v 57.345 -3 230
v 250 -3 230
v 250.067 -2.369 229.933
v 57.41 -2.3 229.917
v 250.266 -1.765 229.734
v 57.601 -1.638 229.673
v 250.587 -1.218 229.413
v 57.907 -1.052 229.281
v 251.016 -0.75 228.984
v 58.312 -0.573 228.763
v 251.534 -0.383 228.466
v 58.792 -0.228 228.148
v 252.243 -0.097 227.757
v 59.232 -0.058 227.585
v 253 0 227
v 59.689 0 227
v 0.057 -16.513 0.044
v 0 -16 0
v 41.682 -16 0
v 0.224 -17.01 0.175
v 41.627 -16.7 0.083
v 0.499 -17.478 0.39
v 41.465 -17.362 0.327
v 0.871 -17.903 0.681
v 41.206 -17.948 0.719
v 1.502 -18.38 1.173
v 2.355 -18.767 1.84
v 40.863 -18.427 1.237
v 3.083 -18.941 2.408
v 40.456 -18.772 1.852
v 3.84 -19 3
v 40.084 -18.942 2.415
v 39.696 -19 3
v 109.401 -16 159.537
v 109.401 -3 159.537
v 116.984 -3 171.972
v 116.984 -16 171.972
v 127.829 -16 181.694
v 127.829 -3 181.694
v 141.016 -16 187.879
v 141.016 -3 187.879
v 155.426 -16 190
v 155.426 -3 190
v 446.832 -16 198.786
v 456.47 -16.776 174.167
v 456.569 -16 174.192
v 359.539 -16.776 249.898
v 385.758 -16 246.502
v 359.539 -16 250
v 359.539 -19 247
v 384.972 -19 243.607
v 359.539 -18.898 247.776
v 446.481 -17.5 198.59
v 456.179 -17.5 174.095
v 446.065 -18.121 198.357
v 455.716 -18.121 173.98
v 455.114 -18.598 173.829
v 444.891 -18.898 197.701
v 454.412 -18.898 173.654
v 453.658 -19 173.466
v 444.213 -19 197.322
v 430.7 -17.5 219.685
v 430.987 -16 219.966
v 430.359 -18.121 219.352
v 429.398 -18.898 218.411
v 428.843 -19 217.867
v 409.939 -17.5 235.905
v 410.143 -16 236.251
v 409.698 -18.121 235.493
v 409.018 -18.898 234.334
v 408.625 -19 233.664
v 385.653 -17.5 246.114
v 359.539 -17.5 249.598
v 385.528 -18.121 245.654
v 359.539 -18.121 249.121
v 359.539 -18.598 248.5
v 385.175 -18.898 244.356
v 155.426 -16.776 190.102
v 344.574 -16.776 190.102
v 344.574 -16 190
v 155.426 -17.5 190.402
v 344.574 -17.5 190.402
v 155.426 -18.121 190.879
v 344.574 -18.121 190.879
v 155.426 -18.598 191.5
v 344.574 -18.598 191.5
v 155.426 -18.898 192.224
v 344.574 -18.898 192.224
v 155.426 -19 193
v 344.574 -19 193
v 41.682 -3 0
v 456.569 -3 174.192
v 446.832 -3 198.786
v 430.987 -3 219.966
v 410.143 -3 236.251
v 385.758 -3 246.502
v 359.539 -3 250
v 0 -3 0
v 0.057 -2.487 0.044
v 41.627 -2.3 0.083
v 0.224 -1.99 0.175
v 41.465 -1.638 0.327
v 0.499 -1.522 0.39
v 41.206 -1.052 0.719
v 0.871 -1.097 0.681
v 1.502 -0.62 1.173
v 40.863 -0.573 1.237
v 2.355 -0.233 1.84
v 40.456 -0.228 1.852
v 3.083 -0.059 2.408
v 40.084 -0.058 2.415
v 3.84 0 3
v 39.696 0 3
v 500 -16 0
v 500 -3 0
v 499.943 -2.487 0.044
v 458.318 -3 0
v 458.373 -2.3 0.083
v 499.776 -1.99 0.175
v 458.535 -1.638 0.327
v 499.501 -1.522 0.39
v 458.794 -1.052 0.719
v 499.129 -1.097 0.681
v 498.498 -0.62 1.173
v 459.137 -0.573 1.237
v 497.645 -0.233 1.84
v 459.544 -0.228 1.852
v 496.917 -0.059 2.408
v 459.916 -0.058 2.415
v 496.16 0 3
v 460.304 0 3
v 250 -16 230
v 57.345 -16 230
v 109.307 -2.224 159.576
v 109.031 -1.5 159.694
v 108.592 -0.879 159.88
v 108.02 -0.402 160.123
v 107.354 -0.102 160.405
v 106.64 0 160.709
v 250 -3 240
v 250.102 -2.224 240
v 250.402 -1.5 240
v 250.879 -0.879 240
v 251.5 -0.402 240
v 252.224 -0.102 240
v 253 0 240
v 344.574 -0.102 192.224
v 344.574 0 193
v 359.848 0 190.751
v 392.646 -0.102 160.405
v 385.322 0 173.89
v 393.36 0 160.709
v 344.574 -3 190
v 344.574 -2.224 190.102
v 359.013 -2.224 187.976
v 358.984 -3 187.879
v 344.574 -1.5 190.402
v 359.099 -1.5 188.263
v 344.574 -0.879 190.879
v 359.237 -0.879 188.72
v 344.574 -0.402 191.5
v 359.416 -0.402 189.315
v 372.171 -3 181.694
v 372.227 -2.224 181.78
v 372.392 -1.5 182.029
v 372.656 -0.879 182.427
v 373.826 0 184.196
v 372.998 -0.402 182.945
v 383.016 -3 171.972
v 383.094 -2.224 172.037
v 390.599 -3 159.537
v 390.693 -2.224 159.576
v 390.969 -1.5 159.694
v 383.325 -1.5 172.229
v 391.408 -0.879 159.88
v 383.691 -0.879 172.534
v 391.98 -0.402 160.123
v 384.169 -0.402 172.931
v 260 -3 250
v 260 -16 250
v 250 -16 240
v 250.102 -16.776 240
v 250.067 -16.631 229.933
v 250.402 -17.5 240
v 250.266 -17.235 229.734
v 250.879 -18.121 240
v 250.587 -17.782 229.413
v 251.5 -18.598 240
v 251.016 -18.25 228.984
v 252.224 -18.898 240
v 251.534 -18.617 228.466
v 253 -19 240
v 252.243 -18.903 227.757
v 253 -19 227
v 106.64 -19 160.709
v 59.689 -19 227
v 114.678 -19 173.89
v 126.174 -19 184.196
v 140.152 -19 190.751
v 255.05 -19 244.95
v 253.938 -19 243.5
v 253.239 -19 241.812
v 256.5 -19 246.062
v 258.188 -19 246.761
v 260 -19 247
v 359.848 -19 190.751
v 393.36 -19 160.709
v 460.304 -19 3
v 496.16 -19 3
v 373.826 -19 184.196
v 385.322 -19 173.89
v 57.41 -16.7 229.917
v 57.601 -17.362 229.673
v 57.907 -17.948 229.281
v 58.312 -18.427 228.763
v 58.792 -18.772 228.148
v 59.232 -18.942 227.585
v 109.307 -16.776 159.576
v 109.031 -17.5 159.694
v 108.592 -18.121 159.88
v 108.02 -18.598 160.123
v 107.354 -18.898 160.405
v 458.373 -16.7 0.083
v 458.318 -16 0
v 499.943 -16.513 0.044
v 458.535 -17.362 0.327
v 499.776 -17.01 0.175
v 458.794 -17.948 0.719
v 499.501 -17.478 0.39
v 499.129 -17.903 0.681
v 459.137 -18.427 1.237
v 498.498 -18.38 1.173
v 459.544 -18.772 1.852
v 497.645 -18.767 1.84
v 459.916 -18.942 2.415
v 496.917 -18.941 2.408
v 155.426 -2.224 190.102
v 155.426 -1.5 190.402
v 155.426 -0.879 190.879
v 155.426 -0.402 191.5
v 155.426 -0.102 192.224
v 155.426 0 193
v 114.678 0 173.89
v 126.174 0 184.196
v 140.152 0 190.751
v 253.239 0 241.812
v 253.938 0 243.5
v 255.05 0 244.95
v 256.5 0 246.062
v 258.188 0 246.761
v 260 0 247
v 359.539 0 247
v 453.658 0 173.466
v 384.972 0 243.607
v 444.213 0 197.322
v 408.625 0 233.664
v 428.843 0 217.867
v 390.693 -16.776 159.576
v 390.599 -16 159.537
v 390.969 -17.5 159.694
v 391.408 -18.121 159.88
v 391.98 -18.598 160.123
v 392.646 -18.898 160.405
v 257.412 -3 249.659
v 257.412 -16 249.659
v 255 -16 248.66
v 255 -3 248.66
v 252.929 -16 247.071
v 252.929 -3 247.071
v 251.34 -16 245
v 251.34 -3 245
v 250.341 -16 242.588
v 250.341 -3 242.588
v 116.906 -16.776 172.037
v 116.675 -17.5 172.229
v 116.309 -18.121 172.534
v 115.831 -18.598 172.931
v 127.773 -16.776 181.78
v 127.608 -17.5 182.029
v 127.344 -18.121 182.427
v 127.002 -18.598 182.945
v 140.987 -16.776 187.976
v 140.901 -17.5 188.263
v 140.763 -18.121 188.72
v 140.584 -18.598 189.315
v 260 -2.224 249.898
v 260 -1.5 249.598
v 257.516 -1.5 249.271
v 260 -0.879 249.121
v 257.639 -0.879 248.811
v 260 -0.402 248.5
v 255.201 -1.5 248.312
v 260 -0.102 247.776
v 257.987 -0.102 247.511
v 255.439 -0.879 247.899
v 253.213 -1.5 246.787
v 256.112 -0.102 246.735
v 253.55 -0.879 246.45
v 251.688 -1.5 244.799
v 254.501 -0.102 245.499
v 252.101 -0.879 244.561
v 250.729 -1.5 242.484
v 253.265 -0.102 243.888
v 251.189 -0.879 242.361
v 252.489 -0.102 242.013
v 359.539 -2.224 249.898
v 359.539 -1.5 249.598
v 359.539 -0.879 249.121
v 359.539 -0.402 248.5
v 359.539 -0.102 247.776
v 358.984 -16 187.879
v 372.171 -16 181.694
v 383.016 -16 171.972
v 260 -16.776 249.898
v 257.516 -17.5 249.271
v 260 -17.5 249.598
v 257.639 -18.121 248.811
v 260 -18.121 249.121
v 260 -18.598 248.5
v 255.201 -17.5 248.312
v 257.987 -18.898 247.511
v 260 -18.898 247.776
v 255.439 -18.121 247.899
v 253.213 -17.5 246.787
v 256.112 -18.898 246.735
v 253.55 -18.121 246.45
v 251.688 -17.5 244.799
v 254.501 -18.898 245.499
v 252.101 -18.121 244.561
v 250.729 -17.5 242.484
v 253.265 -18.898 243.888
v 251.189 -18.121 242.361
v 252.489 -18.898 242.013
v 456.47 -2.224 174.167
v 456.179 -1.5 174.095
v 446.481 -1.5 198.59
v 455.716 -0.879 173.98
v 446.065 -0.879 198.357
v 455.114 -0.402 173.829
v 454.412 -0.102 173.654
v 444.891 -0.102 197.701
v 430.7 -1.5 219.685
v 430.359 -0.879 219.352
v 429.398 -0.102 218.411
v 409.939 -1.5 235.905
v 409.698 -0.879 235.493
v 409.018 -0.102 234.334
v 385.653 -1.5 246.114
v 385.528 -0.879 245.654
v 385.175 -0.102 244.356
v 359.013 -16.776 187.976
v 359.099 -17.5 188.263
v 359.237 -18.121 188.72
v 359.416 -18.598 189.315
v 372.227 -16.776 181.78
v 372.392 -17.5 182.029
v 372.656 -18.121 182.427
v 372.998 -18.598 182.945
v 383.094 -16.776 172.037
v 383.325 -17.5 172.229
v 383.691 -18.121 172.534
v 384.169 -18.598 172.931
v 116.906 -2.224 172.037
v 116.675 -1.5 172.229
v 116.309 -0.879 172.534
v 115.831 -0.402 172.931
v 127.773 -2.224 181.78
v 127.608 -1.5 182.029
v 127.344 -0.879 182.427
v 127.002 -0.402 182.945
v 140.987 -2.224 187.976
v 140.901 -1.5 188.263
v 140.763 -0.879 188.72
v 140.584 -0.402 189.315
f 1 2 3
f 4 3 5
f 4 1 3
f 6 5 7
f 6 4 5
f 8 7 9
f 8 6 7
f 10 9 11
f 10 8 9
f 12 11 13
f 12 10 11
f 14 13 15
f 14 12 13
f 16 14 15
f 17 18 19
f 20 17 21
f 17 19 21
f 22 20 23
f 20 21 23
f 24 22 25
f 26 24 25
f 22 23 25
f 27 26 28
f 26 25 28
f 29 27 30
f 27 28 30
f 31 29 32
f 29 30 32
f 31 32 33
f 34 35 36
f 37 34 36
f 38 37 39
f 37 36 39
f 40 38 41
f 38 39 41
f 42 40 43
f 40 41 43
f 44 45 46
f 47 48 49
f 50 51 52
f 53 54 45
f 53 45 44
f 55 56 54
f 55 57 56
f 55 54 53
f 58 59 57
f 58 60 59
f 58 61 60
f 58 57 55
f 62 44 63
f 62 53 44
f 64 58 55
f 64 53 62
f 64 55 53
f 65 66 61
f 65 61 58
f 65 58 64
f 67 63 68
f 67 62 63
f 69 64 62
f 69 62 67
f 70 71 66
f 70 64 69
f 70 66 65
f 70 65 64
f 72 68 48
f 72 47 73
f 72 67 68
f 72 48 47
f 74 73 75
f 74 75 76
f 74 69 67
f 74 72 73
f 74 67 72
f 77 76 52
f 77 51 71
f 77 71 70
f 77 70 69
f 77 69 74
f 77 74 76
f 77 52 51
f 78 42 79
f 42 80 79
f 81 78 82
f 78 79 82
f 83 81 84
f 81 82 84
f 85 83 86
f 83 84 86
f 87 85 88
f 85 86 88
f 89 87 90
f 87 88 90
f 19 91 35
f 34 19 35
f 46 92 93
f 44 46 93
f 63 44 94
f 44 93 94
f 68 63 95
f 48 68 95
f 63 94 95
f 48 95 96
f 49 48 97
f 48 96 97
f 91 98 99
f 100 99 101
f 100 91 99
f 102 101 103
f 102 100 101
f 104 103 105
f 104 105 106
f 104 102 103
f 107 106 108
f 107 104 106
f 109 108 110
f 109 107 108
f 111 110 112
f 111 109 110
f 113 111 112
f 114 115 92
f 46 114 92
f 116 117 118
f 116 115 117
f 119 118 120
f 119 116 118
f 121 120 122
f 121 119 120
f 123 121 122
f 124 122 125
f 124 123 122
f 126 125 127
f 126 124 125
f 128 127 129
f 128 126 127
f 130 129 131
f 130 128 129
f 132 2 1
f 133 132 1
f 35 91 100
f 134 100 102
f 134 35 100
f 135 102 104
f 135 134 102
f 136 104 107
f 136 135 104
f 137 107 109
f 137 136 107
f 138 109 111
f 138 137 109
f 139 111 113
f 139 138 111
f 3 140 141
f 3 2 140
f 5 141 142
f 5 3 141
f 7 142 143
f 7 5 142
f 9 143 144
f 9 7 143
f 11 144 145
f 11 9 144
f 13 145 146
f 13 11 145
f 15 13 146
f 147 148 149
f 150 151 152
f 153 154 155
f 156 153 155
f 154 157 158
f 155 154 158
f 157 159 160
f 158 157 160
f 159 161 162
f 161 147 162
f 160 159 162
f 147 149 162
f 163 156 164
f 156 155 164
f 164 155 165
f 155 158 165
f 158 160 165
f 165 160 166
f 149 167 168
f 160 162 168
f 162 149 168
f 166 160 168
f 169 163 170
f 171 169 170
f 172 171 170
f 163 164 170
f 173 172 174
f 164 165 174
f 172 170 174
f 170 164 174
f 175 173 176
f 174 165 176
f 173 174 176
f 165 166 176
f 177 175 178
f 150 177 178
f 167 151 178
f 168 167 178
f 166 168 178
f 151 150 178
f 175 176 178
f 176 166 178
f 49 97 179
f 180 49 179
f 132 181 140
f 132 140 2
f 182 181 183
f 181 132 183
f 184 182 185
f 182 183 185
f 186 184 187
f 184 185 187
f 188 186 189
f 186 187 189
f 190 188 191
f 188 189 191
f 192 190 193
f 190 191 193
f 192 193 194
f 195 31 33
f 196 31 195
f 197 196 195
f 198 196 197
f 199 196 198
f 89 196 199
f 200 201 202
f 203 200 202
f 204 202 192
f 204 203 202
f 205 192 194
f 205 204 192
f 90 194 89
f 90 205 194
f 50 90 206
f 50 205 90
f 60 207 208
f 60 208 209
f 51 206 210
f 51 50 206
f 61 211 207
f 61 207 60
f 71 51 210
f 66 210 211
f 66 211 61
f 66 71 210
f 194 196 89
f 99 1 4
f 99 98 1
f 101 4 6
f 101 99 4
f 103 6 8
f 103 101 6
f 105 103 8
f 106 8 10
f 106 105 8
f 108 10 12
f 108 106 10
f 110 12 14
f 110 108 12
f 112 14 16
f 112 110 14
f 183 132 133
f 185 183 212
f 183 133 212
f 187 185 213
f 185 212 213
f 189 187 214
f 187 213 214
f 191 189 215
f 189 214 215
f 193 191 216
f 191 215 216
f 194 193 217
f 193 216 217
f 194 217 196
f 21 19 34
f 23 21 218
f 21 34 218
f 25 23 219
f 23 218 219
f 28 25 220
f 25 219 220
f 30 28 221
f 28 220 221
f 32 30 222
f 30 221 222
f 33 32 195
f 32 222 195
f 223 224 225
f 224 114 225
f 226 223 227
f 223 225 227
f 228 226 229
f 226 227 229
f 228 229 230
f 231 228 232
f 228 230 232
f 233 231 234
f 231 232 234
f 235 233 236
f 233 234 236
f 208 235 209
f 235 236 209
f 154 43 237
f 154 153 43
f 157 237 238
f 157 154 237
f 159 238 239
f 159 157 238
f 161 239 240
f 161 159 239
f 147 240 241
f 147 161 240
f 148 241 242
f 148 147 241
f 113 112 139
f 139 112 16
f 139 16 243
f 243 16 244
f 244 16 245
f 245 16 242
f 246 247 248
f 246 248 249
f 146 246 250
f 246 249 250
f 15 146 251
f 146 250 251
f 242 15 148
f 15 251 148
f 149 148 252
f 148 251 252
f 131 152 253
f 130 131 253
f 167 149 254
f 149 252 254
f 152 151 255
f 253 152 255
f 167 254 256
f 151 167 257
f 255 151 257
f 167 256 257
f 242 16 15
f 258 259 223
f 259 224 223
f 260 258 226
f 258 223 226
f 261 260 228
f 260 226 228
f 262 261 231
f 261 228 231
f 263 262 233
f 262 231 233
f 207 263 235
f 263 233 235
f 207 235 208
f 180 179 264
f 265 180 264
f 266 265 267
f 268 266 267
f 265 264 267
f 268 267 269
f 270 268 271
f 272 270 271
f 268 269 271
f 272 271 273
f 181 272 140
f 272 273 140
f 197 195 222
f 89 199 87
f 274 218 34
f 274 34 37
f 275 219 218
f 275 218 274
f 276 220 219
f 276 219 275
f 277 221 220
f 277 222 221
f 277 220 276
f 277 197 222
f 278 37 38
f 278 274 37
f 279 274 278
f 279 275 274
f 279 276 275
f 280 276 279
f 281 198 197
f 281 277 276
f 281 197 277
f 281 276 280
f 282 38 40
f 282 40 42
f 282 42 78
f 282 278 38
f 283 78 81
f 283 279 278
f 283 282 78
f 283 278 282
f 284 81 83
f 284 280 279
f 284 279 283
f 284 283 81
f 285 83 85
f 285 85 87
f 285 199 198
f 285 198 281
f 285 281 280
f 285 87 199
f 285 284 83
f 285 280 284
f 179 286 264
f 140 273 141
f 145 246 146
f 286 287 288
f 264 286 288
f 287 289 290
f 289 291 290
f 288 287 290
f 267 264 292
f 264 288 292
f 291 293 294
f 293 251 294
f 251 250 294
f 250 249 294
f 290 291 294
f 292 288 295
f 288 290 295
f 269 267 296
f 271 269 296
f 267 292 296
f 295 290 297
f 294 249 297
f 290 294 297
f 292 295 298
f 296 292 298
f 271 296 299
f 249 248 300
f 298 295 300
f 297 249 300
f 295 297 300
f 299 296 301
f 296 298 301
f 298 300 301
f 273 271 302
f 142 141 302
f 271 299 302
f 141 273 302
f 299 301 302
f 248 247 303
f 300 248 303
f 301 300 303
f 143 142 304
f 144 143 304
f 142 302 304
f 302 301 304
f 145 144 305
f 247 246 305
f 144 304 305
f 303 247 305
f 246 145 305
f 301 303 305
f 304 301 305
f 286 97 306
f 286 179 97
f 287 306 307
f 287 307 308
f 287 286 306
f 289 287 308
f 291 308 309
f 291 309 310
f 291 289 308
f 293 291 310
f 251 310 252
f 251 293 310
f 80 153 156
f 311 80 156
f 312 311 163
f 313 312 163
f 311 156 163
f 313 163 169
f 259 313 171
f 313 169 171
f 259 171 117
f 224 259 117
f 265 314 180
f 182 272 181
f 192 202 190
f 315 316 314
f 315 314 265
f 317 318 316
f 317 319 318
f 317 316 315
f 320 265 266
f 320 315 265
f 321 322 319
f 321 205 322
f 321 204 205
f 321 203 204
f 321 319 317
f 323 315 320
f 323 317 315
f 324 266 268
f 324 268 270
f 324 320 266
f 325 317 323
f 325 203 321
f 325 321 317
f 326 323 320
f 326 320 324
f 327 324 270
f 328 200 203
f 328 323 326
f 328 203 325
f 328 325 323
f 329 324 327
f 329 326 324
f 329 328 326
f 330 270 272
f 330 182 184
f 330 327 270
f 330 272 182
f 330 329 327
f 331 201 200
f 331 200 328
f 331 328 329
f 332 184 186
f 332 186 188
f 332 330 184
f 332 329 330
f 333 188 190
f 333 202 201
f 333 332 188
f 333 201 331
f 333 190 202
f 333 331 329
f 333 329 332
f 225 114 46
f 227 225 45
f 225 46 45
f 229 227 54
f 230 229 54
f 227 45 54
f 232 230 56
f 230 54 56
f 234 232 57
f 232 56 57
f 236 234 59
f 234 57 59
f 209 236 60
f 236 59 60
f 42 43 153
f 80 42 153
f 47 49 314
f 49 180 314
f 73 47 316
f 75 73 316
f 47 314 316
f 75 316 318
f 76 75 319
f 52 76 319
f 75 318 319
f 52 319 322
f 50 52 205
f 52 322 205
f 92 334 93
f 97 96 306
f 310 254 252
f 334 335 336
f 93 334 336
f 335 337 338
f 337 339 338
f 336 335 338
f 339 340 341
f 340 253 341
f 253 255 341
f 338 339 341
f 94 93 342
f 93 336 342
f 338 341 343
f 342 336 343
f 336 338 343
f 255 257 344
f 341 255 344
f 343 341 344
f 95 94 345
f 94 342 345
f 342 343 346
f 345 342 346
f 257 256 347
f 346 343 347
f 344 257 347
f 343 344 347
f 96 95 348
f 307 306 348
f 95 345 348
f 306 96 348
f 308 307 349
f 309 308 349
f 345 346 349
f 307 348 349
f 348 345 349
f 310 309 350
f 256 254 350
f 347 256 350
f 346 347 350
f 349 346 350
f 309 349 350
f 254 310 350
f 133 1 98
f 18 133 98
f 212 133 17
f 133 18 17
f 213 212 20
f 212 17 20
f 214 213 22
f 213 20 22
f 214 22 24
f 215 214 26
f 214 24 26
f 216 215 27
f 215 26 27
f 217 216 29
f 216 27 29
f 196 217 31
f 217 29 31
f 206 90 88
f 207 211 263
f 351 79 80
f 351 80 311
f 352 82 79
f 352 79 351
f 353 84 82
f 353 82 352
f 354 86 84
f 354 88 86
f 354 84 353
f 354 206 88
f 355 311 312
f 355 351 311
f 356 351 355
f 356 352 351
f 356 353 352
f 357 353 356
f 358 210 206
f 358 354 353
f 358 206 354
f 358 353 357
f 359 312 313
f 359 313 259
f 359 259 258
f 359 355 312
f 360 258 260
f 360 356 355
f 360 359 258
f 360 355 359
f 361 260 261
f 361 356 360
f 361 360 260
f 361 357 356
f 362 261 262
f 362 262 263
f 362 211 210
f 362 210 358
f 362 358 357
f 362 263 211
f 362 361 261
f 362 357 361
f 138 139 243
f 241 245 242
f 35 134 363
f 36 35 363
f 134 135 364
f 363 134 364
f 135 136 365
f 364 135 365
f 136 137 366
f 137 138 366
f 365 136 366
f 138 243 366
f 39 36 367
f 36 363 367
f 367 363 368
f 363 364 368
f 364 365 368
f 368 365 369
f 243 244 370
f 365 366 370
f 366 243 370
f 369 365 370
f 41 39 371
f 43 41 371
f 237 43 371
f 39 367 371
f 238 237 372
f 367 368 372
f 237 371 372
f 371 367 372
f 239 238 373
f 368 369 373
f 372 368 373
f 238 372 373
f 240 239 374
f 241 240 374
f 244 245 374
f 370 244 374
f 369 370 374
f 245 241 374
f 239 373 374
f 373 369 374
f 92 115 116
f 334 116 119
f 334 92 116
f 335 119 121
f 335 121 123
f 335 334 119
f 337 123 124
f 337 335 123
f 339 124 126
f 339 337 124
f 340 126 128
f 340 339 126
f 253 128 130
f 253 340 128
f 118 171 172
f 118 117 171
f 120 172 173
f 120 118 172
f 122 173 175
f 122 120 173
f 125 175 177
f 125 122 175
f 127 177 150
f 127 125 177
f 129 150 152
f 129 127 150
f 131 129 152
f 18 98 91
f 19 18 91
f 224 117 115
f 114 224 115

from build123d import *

# Parameters (mm, degrees)
F1_DEPTH = 19
F2_R     = 3


with BuildPart() as f1:
    # F0 (on Front) → F1 (new body)
    with BuildSketch(Plane.XZ):
        with BuildLine():
            Line((57.345441, 230), (0, 0))
            Line((0, 0), (41.681786, 0))
            Line((41.681786, 0), (109.401036, 159.536556))
            ThreePointArc((109.401036, 159.536556), (127.82943, 181.694291), (155.426279, 190))
            Line((155.426279, 190), (250, 190))
            Line((250, 190), (344.573721, 190))
            ThreePointArc((344.573721, 190), (372.17057, 181.694291), (390.598964, 159.536556))
            Line((390.598964, 159.536556), (458.318214, 0))
            Line((458.318214, 0), (500, 0))
            Line((500, 0), (456.569009, 174.19219))
            ThreePointArc((456.569009, 174.19219), (421.105584, 228.801075), (359.539437, 250))
            Line((359.539437, 250), (260, 250))
            ThreePointArc((260, 250), (252.928932, 247.071068), (250, 240))
            Line((250, 240), (250, 230))
            Line((250, 230), (57.345441, 230))
        make_face()
    extrude(amount=F1_DEPTH)

    # F2
    f2_edges = [f1.edges().sort_by_distance(p)[0] for p in [
        (28.67272, -19, 115),
        (20.840893, -19, 0),
        (75.541411, -19, 79.768278),
        (127.82943, -19, 181.694291),
        (250, -19, 190),
        (372.17057, -19, 181.694291),
        (424.458589, -19, 79.768278),
        (479.159107, -19, 0),
        (478.284505, -19, 87.096095),
        (421.105584, -19, 228.801075),
        (309.769718, -19, 250),
        (252.928932, -19, 247.071068),
        (250, -19, 235),
        (153.67272, -19, 230),
        (28.67272, 0, 115),
        (20.840893, 0, 0),
        (75.541411, 0, 79.768278),
        (127.82943, 0, 181.694291),
        (250, 0, 190),
        (372.17057, 0, 181.694291),
        (424.458589, 0, 79.768278),
        (479.159107, 0, 0),
        (478.284505, 0, 87.096095),
        (421.105584, 0, 228.801075),
        (309.769718, 0, 250),
        (252.928932, 0, 247.071068),
        (250, 0, 235),
        (153.67272, 0, 230),
    ]]
    fillet(f2_edges, radius=F2_R)


solid = f1.part
